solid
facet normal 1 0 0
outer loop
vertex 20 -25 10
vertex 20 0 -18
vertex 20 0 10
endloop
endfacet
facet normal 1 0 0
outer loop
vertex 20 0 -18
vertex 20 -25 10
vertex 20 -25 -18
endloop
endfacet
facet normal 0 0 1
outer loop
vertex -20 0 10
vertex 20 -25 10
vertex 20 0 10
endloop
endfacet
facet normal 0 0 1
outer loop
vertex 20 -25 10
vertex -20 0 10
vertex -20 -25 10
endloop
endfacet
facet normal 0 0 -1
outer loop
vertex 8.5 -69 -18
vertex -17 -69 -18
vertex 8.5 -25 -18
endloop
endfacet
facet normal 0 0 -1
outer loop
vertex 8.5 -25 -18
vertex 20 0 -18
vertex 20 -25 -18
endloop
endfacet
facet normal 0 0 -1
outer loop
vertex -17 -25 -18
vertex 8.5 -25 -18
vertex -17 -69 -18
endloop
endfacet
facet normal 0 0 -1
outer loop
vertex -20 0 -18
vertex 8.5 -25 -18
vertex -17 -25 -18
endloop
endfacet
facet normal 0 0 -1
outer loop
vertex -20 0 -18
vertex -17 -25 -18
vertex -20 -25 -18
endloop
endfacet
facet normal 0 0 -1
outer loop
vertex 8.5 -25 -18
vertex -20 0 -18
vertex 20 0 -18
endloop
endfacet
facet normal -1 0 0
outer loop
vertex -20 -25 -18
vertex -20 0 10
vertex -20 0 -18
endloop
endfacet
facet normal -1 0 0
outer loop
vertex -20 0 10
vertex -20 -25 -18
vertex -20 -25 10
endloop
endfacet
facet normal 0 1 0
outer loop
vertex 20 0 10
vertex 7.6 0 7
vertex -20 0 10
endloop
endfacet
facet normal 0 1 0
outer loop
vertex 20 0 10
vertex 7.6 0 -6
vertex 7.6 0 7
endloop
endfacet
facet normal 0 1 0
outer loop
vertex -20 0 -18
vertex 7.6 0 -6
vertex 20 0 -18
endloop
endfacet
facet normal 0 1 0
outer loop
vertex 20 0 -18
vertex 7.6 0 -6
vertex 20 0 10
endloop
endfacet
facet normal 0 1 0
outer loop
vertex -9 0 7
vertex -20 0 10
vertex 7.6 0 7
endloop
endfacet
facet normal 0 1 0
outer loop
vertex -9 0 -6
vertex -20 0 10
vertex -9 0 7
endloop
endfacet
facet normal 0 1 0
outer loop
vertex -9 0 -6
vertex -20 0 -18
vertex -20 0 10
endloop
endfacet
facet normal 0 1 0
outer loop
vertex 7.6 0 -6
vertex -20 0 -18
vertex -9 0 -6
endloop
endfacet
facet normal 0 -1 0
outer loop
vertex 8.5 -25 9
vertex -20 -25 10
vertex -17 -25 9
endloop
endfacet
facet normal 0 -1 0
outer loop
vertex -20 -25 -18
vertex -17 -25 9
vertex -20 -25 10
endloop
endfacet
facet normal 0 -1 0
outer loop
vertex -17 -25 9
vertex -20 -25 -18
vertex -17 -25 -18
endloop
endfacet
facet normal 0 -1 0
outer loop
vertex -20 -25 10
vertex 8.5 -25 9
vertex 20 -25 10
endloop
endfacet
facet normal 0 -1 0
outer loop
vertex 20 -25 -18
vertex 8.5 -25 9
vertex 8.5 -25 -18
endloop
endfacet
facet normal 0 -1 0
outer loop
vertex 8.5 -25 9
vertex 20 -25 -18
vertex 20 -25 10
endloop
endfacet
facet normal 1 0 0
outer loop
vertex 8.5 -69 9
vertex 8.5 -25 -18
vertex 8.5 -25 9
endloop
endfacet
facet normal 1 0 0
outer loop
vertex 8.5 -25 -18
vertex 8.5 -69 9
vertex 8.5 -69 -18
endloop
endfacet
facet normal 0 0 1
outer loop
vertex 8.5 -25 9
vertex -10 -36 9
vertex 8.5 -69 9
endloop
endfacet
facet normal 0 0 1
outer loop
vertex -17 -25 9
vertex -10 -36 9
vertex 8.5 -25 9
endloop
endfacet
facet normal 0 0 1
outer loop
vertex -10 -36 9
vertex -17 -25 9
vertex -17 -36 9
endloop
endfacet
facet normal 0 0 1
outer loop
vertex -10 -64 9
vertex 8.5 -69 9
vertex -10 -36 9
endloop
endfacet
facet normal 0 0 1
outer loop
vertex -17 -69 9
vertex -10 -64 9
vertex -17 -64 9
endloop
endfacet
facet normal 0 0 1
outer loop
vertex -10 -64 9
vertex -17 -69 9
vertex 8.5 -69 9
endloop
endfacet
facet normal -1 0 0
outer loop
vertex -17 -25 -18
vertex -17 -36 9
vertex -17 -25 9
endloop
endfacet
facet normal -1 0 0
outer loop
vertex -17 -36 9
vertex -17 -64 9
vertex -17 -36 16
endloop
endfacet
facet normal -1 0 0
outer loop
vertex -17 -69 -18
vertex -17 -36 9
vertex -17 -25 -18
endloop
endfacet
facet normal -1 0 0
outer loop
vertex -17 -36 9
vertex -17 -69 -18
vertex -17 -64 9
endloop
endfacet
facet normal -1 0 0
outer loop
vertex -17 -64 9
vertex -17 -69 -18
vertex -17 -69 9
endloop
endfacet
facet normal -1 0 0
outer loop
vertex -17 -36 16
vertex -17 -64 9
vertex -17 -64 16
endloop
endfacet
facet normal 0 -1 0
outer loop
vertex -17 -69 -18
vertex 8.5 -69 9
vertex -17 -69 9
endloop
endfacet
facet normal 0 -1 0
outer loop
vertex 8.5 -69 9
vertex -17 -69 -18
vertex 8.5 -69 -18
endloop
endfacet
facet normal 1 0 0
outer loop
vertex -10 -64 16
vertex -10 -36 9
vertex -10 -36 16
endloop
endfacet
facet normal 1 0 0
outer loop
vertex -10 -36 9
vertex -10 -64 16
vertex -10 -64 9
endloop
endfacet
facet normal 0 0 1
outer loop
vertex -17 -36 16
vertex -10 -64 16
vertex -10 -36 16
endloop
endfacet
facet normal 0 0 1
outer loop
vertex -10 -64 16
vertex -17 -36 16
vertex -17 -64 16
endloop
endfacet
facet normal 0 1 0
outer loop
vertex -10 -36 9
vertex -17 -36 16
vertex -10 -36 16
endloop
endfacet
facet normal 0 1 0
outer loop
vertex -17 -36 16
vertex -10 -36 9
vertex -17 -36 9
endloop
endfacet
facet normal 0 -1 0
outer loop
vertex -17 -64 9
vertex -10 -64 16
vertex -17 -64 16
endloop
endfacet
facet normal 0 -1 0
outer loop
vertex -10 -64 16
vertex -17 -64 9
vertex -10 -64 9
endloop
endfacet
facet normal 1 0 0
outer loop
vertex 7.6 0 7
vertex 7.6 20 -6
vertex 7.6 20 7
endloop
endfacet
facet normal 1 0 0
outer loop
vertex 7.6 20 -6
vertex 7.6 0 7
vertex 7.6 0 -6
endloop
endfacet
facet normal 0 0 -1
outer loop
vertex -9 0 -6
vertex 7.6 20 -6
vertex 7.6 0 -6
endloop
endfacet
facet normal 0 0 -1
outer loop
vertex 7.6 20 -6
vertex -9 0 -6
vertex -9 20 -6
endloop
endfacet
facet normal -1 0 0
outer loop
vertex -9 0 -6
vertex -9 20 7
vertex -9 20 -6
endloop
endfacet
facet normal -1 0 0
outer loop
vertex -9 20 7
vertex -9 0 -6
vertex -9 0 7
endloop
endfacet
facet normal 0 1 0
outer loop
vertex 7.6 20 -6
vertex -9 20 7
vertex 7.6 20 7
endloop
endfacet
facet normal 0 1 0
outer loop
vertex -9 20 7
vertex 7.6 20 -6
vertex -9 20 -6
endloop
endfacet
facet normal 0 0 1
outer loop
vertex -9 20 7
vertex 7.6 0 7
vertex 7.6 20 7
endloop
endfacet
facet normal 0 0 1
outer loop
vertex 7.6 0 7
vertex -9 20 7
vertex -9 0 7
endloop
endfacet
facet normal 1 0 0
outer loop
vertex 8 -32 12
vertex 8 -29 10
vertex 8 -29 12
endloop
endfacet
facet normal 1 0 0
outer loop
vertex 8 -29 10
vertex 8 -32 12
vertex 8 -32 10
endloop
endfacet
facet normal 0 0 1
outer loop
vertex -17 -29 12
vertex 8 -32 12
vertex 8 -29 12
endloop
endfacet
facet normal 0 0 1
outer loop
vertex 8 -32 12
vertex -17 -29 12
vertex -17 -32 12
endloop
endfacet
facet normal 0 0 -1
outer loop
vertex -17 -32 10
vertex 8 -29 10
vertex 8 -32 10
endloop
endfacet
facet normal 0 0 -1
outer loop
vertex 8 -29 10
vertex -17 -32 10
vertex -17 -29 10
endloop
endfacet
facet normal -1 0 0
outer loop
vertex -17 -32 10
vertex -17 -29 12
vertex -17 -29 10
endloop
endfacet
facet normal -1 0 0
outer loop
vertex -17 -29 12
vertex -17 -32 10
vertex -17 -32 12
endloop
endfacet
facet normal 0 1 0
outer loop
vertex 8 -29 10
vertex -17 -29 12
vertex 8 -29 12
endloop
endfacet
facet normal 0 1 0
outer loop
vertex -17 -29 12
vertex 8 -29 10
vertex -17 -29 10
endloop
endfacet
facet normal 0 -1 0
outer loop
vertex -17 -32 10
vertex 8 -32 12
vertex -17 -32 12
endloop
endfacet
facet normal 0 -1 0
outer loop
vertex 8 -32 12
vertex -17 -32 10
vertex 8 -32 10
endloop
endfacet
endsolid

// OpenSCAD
// Prototype part envelopes. Export one part at a time using the selector below.
$fn = 96;
module local_box(p, s) { translate(p) cube(s, center=true); }
module local_cylinder(p, d, l) { translate(p) cylinder(d=d,h=l,center=true); }
part = "plug";
module plug() {
    local_box([0,-12.5,-4], [40,25,28]);
    local_box([-4.25,-47,-4.5], [25.5,44,27]);
    local_box([-13.5,-50,12.5], [7,28,7]);
    local_box([-0.7,10,-1.5], [16.6,20,9]);
    local_box([-0.7,10,5], [16.6,20,4]);
    local_box([7.15,6.5,0.5], [0.9,7,13]);
    local_box([-4.5,-30.5,11], [25,3,2]);
}
module socket() {
    local_box([0,12,-13], [46,24,10]);
    local_box([-17,12,5], [12,24,26]);
    local_box([20,12,5], [6,24,26]);
    local_box([3,12,13.5], [28,24,9]);
    local_box([13.75,6.5,0], [6.5,5,16]);
    local_box([0,27.5,0], [46,7,36]);
    local_box([0,50,0], [26,38,36]);
}
module latch() {
    local_box([13.2,13.5,0.5], [2.4,5,11]);
    local_box([8.8,-7.5,4.5], [2.4,47,3]);
    local_box([11,13.5,4.5], [2.4,5,3]);
    local_box([15.5,-45.5,6.5], [15,27,21]);
    local_box([10,-28,8.5], [4,10,11]);
    local_box([3.5,-20,13.5], [13,12,5]);
}
module safety() {
    local_box([-6.05,-19.75,14], [4.9,8.5,7]);
    local_box([-6.5,-63,16.5], [5,78,3]);
    local_box([-5,-107.5,26], [22,23,16]);
    local_box([-5,-117.5,34.5], [22,3,1]);
}
if (part == "plug") plug();
if (part == "socket") socket();
if (part == "latch") latch();
if (part == "safety") safety();
